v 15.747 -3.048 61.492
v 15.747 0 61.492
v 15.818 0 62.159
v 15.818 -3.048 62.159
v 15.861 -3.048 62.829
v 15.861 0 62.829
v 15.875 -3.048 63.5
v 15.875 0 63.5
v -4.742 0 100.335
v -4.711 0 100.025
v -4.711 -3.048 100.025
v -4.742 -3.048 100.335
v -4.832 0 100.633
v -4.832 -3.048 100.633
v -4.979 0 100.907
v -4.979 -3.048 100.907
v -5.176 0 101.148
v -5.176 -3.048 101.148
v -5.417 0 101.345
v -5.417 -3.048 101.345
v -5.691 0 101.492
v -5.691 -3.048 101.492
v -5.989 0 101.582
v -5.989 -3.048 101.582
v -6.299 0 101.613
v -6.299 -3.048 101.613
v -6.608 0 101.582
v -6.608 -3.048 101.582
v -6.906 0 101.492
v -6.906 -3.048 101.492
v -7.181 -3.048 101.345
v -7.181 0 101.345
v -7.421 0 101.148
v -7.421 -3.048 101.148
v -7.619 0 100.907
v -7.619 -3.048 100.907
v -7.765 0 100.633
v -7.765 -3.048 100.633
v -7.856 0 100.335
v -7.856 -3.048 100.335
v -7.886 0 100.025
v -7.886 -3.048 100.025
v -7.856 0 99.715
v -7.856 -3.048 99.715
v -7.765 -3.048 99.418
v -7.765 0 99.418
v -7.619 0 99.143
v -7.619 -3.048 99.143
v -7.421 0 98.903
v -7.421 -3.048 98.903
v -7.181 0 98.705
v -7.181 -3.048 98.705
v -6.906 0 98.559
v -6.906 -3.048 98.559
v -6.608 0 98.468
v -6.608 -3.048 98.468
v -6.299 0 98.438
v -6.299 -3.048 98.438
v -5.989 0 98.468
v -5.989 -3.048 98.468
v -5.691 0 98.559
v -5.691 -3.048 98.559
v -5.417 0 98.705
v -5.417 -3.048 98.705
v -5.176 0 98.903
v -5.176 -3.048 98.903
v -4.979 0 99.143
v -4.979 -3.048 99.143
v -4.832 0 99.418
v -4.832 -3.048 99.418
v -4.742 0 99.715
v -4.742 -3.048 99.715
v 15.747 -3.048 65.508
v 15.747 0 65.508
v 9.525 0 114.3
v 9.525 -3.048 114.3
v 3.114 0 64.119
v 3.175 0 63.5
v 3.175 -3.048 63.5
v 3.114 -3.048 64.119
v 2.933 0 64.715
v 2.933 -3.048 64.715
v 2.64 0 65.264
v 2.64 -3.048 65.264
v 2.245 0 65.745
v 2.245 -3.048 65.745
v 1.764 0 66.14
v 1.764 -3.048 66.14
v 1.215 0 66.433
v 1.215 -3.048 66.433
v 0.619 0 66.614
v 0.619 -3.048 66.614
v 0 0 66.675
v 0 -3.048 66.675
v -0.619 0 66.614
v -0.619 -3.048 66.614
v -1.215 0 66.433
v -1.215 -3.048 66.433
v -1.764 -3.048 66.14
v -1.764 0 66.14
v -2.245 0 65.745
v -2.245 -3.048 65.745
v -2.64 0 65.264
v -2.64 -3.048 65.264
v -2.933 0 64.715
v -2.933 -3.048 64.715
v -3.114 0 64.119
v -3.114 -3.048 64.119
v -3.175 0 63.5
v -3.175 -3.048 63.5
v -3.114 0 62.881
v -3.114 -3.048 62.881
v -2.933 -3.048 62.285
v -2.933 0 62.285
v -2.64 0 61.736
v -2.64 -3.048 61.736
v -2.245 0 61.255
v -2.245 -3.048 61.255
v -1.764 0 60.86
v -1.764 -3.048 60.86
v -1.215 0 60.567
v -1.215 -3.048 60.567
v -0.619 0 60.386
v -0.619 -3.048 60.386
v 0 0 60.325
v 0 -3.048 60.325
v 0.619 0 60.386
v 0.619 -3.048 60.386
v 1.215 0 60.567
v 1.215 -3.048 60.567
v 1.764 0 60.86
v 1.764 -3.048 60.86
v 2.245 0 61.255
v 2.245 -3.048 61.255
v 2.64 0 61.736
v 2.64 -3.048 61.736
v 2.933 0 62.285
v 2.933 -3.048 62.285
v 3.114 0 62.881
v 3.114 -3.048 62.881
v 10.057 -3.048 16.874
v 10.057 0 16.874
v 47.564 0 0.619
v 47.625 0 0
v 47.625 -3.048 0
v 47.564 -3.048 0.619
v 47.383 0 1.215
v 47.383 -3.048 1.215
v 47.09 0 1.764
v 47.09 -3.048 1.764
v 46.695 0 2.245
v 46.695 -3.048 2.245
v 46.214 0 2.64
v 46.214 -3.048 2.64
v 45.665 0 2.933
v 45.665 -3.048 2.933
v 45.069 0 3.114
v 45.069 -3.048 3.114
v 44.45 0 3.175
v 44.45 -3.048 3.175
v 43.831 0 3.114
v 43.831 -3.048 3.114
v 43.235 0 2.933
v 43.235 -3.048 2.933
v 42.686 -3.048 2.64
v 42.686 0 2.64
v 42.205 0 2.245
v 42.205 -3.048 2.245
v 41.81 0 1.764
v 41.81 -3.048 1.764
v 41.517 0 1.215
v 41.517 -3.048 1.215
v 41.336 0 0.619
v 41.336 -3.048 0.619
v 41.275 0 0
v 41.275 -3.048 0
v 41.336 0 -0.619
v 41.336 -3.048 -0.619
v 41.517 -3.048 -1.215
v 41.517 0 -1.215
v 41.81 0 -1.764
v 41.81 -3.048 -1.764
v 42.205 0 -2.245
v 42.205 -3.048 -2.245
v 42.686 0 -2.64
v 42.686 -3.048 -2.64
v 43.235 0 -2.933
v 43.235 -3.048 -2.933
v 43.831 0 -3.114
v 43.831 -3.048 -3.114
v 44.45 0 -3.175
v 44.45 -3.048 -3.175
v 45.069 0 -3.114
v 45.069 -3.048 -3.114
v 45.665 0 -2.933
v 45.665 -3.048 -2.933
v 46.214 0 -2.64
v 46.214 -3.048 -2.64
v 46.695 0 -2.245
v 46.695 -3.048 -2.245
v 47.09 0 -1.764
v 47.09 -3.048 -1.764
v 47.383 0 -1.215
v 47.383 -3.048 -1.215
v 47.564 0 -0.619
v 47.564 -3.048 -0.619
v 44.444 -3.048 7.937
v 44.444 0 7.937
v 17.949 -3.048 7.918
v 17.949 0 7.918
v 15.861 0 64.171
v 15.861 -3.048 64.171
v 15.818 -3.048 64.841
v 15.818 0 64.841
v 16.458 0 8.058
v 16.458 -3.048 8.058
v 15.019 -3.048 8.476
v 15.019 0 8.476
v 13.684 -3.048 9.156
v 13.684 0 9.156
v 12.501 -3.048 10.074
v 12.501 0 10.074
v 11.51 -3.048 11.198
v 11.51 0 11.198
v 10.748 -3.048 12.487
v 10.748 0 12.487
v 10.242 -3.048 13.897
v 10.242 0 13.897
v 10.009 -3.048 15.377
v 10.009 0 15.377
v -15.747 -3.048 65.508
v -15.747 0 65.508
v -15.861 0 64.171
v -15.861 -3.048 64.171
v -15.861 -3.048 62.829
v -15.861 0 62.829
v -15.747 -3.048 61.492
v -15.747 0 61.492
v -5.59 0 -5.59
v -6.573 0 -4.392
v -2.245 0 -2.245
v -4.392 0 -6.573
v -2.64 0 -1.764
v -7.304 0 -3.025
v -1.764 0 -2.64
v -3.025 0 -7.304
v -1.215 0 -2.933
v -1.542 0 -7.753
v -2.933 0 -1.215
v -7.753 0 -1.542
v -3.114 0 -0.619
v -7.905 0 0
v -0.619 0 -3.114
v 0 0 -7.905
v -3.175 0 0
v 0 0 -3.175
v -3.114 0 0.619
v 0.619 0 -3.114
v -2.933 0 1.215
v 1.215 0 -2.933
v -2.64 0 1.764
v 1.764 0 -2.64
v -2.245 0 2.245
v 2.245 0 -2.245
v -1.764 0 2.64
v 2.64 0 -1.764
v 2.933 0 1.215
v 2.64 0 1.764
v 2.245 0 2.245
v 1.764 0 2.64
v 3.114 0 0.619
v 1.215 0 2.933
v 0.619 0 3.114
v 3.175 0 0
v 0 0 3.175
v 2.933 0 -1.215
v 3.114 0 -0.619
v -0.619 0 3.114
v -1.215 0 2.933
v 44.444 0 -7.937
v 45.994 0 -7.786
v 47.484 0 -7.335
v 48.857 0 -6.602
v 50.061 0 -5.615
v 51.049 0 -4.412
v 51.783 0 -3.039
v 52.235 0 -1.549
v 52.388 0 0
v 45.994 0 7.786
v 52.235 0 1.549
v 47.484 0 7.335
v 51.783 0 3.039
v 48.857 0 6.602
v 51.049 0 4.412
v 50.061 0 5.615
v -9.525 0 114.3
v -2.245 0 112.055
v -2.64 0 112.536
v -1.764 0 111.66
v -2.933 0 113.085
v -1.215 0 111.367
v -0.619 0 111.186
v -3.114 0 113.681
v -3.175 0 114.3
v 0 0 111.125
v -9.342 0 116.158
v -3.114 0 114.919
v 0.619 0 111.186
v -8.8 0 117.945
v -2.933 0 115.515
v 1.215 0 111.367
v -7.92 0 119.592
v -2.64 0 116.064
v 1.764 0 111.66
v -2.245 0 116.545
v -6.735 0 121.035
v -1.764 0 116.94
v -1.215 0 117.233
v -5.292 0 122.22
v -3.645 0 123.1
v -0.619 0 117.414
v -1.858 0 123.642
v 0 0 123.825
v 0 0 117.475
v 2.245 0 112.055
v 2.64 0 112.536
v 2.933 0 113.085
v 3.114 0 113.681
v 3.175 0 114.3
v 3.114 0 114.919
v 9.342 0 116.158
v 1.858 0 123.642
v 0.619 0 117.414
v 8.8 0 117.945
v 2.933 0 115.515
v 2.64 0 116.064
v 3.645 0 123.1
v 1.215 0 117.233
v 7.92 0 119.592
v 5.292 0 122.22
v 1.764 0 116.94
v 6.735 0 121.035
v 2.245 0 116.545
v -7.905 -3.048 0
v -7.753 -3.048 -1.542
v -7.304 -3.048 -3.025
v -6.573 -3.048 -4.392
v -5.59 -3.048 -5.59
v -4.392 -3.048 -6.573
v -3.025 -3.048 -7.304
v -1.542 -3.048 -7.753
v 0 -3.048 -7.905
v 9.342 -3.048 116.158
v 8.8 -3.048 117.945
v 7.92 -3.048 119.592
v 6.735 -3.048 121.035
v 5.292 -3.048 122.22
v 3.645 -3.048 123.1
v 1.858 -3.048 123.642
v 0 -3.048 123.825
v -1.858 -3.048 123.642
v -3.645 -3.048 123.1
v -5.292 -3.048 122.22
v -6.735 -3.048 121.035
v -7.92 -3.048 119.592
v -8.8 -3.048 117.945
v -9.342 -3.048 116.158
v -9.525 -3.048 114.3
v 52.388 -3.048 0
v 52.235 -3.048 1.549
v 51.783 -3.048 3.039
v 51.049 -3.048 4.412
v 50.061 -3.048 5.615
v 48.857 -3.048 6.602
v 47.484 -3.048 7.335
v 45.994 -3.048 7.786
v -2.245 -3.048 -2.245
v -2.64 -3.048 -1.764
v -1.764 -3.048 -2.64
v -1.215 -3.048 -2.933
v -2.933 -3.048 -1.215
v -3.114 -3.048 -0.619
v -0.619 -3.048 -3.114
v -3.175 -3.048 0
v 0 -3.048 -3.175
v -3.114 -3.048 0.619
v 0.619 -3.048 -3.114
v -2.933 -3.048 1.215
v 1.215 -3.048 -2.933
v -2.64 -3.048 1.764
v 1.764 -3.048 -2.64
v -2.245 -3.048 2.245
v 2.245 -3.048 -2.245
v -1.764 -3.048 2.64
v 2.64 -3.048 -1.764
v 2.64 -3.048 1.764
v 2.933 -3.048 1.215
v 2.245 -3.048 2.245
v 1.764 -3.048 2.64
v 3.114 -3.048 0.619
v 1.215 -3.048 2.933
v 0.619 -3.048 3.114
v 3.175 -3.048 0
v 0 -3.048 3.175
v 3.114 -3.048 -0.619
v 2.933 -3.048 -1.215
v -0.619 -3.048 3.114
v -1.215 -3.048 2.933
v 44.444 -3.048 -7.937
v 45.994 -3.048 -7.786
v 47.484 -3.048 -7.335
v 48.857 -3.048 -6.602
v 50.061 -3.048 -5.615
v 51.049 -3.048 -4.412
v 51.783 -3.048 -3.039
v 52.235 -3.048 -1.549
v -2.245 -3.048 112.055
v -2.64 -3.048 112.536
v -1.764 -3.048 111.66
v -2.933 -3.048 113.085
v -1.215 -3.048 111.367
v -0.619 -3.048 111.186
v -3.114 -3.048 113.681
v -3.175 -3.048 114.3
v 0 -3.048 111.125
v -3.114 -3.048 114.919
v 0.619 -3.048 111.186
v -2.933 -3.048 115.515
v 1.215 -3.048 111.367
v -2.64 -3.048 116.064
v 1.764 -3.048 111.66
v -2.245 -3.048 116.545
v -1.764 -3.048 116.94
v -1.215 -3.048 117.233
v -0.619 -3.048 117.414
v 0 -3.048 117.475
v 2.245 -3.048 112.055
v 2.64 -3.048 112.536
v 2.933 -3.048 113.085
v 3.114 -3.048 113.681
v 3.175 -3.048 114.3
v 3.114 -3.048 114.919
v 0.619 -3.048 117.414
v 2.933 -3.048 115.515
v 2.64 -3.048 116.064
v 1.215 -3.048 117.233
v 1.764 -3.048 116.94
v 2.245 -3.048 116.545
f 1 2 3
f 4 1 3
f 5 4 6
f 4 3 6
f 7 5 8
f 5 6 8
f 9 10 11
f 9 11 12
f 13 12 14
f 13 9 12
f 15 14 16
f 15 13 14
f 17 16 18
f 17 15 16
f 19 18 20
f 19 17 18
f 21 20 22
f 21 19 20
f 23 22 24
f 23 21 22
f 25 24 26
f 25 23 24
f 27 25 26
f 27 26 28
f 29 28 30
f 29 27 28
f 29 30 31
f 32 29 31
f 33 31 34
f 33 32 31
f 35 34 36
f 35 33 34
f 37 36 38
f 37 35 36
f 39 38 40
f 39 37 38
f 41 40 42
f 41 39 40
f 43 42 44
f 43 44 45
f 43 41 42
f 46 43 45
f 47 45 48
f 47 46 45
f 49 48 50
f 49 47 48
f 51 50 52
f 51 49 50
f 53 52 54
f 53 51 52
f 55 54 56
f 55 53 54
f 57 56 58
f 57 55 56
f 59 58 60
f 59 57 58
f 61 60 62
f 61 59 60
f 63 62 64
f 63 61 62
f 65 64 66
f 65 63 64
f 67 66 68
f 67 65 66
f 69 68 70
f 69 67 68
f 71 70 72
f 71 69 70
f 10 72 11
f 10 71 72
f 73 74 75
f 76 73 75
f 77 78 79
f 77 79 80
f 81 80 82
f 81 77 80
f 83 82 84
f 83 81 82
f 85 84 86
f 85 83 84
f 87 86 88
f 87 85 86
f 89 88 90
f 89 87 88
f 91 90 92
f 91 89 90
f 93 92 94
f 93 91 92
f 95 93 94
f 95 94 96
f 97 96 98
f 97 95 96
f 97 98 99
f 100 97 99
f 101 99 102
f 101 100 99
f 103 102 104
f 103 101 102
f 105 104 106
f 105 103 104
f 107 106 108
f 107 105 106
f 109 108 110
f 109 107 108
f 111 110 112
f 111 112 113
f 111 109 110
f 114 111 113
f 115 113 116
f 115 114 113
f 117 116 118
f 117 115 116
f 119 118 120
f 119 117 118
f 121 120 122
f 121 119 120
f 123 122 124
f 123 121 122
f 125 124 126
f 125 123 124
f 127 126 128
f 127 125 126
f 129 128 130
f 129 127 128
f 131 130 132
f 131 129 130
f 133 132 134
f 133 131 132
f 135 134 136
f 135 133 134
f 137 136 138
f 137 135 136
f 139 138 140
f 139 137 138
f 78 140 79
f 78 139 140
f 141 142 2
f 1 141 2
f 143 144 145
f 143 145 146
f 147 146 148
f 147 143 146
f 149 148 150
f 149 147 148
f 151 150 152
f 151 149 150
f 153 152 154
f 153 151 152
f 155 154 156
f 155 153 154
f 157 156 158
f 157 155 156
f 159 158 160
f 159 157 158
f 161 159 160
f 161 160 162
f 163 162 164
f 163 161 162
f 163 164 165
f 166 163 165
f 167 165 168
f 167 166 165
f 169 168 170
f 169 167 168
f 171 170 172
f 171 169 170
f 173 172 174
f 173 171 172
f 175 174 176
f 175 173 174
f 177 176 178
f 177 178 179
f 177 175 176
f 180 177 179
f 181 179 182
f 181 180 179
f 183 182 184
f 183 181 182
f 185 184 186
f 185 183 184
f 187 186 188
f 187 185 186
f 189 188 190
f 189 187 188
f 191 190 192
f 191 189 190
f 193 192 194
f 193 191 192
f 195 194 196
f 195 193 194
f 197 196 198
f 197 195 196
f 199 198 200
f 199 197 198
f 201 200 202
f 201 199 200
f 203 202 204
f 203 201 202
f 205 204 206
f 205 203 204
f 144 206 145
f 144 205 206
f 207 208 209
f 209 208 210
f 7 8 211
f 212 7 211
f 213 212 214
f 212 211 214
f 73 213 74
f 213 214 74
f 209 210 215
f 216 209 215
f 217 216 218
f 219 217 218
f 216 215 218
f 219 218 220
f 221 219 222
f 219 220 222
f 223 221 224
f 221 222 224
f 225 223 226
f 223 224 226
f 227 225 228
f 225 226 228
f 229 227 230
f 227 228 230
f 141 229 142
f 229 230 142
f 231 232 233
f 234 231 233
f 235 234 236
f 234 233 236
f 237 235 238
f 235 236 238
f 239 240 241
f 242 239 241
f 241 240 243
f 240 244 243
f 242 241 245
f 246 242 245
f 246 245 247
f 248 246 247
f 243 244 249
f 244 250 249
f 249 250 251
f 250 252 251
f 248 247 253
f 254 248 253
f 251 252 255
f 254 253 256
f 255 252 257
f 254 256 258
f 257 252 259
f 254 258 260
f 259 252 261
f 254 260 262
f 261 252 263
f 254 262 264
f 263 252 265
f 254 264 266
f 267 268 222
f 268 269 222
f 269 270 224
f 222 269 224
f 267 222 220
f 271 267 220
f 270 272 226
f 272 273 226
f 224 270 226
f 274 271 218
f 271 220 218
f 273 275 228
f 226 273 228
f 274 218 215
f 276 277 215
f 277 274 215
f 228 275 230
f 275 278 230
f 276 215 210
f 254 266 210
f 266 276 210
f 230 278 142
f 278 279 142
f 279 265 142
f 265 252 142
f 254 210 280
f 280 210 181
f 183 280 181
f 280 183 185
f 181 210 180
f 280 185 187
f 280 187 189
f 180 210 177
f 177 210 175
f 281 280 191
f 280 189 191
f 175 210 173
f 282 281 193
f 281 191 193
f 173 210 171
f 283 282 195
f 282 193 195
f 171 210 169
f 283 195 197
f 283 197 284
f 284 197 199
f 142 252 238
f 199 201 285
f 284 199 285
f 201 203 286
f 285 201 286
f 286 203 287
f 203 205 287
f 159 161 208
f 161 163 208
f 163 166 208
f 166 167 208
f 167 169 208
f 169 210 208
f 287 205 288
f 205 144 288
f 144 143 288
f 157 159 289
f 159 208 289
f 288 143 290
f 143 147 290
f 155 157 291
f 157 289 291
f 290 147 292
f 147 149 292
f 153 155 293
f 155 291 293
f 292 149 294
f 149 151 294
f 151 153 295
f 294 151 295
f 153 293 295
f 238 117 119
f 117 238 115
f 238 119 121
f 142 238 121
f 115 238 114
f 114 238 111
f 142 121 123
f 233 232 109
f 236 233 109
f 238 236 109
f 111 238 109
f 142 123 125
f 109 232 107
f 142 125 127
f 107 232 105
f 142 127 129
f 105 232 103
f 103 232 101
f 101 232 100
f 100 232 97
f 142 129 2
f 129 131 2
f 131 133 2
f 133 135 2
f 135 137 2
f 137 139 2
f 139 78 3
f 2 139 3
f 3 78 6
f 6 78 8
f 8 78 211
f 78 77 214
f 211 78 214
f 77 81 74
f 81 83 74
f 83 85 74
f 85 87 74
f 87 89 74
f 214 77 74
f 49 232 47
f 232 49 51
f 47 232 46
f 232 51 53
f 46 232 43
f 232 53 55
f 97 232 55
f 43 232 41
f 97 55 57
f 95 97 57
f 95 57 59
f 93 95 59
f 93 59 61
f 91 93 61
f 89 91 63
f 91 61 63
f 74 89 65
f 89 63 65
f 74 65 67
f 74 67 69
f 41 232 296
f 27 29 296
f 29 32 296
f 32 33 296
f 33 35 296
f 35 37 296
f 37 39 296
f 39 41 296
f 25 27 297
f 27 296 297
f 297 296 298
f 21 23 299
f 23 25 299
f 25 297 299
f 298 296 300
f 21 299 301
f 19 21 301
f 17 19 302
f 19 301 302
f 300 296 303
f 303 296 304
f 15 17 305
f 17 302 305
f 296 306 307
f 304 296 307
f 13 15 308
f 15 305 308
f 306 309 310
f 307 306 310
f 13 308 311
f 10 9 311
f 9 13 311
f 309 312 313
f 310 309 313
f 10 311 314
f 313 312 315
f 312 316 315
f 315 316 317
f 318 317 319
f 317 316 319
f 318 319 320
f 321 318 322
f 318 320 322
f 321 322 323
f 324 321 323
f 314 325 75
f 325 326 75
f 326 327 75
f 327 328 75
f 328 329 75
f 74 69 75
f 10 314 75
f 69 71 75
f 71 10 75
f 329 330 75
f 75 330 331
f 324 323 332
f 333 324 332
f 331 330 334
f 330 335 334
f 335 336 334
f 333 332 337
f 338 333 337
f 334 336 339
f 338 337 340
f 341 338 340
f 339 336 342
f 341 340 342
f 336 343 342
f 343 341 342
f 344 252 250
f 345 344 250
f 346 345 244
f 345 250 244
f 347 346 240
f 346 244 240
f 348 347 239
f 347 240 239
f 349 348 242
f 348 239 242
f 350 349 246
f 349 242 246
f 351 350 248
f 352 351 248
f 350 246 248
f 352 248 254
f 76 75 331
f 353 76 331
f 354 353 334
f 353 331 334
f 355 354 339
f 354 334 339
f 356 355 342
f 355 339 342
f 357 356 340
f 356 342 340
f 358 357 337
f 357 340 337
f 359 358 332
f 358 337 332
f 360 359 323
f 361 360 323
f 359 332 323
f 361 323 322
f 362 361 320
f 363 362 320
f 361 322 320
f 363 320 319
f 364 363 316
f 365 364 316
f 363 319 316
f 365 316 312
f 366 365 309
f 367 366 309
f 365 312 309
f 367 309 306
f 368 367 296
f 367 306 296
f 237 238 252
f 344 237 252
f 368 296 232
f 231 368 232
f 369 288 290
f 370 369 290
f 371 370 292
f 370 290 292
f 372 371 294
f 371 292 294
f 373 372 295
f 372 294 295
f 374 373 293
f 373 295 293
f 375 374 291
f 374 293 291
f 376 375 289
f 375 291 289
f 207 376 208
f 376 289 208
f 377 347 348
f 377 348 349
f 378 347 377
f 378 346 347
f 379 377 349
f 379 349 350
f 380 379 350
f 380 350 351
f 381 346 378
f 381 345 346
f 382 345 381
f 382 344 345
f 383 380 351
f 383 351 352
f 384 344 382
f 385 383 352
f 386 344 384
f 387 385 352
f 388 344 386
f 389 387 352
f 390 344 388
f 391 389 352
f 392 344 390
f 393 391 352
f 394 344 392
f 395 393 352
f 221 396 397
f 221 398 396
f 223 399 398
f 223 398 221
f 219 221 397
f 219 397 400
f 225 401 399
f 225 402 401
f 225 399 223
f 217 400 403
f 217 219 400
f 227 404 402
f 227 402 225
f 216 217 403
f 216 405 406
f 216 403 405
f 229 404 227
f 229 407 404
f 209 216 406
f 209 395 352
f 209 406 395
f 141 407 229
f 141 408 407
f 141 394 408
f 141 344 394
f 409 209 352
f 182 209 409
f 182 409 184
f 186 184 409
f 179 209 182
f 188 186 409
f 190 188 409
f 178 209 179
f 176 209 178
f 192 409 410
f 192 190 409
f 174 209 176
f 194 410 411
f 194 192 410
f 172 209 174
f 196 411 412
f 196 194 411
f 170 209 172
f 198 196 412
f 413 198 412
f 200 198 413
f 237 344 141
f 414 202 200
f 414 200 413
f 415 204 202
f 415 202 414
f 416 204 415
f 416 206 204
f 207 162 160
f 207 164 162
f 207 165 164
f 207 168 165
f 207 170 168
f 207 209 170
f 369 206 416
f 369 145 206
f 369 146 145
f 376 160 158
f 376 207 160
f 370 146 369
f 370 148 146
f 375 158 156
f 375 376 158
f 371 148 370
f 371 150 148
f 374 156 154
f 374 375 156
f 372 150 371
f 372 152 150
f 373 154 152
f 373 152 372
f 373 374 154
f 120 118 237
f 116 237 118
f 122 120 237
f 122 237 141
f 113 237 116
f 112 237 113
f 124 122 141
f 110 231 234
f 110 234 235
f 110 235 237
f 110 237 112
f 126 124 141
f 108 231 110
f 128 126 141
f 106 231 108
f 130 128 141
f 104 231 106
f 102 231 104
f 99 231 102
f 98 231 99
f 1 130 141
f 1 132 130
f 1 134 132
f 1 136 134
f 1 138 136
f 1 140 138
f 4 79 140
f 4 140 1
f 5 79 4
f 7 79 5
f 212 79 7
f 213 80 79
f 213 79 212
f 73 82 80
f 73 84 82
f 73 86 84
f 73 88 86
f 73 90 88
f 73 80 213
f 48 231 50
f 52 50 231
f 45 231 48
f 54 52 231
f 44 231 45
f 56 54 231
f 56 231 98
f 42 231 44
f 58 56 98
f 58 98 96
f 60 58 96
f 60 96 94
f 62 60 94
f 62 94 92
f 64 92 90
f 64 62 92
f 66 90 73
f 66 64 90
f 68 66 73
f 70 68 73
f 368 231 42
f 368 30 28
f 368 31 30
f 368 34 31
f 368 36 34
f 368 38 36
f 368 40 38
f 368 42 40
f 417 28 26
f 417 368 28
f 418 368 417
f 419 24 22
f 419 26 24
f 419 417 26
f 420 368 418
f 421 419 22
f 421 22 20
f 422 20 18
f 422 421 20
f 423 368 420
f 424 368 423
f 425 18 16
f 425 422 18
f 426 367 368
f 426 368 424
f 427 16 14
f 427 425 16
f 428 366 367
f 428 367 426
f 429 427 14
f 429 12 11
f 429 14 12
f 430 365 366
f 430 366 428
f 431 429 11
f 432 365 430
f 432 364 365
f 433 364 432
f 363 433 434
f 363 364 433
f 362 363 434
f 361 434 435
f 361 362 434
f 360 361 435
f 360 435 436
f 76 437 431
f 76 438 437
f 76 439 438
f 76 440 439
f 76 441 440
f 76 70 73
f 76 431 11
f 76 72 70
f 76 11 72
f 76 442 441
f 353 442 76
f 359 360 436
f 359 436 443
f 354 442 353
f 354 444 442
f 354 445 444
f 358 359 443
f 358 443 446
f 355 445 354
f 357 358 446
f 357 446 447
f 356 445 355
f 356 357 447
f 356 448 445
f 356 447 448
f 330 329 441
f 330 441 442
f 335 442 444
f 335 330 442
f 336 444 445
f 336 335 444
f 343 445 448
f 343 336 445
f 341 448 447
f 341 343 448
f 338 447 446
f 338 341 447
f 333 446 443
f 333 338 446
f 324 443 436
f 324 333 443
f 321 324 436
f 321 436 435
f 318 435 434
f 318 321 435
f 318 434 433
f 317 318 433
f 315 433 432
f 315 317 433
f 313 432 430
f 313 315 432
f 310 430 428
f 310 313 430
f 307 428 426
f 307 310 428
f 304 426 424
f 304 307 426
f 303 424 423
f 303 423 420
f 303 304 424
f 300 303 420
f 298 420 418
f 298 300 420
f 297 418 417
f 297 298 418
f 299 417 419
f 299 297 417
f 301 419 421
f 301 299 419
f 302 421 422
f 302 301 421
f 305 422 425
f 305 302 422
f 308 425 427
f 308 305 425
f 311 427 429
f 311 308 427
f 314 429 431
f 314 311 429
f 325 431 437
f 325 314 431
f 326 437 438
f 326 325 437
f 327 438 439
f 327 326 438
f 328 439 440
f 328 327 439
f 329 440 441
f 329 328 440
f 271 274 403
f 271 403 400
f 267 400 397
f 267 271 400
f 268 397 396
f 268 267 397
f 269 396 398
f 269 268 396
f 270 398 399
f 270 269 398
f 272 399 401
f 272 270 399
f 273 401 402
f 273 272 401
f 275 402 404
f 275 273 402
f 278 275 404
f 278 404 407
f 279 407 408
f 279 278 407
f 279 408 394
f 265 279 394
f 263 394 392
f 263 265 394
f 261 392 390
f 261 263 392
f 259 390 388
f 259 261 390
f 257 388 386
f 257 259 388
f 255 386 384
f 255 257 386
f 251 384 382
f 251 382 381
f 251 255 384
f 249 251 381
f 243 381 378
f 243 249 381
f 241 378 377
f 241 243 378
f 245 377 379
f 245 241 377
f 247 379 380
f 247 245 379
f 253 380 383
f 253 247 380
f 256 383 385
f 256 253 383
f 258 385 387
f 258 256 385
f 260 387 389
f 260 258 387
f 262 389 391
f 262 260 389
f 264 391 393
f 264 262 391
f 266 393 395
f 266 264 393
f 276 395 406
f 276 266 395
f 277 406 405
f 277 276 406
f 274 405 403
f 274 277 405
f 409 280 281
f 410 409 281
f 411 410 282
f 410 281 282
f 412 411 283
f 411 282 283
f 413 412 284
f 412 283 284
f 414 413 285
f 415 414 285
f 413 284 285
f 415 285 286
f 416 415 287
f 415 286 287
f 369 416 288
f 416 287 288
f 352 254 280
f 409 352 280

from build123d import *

# Parameters (mm, degrees)
F0_R     = 3.175
F0_R_2   = 1.5875
F1_DEPTH = 3.048


with BuildPart() as f1:
    # F0 (on Front) → F1 (new body)
    with BuildSketch(Plane.XZ):
        with BuildLine():
            ThreePointArc((44.44426, -7.937498), (50.06063, -5.614689), (52.3875, 0))
            ThreePointArc((52.3875, 0), (50.06063, 5.614689), (44.44426, 7.937498))
            ThreePointArc((44.44426, 7.937498), (36.5125, 0), (44.44426, -7.937498))
        make_face()
        with Locations((44.45, 0)):
            Circle(F0_R, mode=Mode.SUBTRACT)
        with BuildLine():
            ThreePointArc((44.44426, -7.937498), (36.5125, 0), (44.44426, 7.937498))
            Line((44.44426, 7.937498), (17.949427, 7.918338))
            ThreePointArc((17.949427, 7.918338), (11.978937, 10.612345), (10.057351, 16.874287))
            Line((10.057351, 16.874287), (15.747457, 61.491711))
            ThreePointArc((15.747457, 61.491711), (0, 47.625), (-15.747457, 61.491711))
            Line((-15.747457, 61.491711), (-7.905356, 0))
            ThreePointArc((-7.905356, 0), (0, 7.905356), (7.905356, 0))
            ThreePointArc((7.905356, 0), (5.589931, -5.589931), (0, -7.905356))
            Line((0, -7.905356), (44.44426, -7.937498))
        make_face()
        with BuildLine():
            ThreePointArc((-7.905356, 0), (-5.589931, -5.589931), (0, -7.905356))
            ThreePointArc((0, -7.905356), (5.589931, -5.589931), (7.905356, 0))
            ThreePointArc((7.905356, 0), (0, 7.905356), (-7.905356, 0))
        make_face()
        Circle(F0_R, mode=Mode.SUBTRACT)
        with BuildLine():
            ThreePointArc((-15.747457, 61.491711), (0, 47.625), (15.747457, 61.491711))
            ThreePointArc((15.747457, 61.491711), (15.843082, 62.493832), (15.875, 63.5))
            ThreePointArc((15.875, 63.5), (15.843082, 64.506168), (15.747457, 65.508289))
            ThreePointArc((15.747457, 65.508289), (0, 79.375), (-15.747457, 65.508289))
            ThreePointArc((-15.747457, 65.508289), (-15.875, 63.5), (-15.747457, 61.491711))
        make_face()
        with Locations((0, 63.5)):
            Circle(F0_R, mode=Mode.SUBTRACT)
        with BuildLine():
            Line((-9.525, 114.3), (-15.747457, 65.508289))
            ThreePointArc((-15.747457, 65.508289), (0, 79.375), (15.747457, 65.508289))
            Line((15.747457, 65.508289), (9.525, 114.3))
            ThreePointArc((9.525, 114.3), (0, 104.775), (-9.525, 114.3))
        make_face()
        with Locations((-6.298599, 100.0252)):
            Circle(F0_R_2, mode=Mode.SUBTRACT)
        with BuildLine():
            ThreePointArc((9.525, 114.3), (0, 123.825), (-9.525, 114.3))
            ThreePointArc((-9.525, 114.3), (0, 104.775), (9.525, 114.3))
        make_face()
        with Locations((0, 114.3)):
            Circle(F0_R, mode=Mode.SUBTRACT)
    extrude(amount=F1_DEPTH)


solid = f1.part
